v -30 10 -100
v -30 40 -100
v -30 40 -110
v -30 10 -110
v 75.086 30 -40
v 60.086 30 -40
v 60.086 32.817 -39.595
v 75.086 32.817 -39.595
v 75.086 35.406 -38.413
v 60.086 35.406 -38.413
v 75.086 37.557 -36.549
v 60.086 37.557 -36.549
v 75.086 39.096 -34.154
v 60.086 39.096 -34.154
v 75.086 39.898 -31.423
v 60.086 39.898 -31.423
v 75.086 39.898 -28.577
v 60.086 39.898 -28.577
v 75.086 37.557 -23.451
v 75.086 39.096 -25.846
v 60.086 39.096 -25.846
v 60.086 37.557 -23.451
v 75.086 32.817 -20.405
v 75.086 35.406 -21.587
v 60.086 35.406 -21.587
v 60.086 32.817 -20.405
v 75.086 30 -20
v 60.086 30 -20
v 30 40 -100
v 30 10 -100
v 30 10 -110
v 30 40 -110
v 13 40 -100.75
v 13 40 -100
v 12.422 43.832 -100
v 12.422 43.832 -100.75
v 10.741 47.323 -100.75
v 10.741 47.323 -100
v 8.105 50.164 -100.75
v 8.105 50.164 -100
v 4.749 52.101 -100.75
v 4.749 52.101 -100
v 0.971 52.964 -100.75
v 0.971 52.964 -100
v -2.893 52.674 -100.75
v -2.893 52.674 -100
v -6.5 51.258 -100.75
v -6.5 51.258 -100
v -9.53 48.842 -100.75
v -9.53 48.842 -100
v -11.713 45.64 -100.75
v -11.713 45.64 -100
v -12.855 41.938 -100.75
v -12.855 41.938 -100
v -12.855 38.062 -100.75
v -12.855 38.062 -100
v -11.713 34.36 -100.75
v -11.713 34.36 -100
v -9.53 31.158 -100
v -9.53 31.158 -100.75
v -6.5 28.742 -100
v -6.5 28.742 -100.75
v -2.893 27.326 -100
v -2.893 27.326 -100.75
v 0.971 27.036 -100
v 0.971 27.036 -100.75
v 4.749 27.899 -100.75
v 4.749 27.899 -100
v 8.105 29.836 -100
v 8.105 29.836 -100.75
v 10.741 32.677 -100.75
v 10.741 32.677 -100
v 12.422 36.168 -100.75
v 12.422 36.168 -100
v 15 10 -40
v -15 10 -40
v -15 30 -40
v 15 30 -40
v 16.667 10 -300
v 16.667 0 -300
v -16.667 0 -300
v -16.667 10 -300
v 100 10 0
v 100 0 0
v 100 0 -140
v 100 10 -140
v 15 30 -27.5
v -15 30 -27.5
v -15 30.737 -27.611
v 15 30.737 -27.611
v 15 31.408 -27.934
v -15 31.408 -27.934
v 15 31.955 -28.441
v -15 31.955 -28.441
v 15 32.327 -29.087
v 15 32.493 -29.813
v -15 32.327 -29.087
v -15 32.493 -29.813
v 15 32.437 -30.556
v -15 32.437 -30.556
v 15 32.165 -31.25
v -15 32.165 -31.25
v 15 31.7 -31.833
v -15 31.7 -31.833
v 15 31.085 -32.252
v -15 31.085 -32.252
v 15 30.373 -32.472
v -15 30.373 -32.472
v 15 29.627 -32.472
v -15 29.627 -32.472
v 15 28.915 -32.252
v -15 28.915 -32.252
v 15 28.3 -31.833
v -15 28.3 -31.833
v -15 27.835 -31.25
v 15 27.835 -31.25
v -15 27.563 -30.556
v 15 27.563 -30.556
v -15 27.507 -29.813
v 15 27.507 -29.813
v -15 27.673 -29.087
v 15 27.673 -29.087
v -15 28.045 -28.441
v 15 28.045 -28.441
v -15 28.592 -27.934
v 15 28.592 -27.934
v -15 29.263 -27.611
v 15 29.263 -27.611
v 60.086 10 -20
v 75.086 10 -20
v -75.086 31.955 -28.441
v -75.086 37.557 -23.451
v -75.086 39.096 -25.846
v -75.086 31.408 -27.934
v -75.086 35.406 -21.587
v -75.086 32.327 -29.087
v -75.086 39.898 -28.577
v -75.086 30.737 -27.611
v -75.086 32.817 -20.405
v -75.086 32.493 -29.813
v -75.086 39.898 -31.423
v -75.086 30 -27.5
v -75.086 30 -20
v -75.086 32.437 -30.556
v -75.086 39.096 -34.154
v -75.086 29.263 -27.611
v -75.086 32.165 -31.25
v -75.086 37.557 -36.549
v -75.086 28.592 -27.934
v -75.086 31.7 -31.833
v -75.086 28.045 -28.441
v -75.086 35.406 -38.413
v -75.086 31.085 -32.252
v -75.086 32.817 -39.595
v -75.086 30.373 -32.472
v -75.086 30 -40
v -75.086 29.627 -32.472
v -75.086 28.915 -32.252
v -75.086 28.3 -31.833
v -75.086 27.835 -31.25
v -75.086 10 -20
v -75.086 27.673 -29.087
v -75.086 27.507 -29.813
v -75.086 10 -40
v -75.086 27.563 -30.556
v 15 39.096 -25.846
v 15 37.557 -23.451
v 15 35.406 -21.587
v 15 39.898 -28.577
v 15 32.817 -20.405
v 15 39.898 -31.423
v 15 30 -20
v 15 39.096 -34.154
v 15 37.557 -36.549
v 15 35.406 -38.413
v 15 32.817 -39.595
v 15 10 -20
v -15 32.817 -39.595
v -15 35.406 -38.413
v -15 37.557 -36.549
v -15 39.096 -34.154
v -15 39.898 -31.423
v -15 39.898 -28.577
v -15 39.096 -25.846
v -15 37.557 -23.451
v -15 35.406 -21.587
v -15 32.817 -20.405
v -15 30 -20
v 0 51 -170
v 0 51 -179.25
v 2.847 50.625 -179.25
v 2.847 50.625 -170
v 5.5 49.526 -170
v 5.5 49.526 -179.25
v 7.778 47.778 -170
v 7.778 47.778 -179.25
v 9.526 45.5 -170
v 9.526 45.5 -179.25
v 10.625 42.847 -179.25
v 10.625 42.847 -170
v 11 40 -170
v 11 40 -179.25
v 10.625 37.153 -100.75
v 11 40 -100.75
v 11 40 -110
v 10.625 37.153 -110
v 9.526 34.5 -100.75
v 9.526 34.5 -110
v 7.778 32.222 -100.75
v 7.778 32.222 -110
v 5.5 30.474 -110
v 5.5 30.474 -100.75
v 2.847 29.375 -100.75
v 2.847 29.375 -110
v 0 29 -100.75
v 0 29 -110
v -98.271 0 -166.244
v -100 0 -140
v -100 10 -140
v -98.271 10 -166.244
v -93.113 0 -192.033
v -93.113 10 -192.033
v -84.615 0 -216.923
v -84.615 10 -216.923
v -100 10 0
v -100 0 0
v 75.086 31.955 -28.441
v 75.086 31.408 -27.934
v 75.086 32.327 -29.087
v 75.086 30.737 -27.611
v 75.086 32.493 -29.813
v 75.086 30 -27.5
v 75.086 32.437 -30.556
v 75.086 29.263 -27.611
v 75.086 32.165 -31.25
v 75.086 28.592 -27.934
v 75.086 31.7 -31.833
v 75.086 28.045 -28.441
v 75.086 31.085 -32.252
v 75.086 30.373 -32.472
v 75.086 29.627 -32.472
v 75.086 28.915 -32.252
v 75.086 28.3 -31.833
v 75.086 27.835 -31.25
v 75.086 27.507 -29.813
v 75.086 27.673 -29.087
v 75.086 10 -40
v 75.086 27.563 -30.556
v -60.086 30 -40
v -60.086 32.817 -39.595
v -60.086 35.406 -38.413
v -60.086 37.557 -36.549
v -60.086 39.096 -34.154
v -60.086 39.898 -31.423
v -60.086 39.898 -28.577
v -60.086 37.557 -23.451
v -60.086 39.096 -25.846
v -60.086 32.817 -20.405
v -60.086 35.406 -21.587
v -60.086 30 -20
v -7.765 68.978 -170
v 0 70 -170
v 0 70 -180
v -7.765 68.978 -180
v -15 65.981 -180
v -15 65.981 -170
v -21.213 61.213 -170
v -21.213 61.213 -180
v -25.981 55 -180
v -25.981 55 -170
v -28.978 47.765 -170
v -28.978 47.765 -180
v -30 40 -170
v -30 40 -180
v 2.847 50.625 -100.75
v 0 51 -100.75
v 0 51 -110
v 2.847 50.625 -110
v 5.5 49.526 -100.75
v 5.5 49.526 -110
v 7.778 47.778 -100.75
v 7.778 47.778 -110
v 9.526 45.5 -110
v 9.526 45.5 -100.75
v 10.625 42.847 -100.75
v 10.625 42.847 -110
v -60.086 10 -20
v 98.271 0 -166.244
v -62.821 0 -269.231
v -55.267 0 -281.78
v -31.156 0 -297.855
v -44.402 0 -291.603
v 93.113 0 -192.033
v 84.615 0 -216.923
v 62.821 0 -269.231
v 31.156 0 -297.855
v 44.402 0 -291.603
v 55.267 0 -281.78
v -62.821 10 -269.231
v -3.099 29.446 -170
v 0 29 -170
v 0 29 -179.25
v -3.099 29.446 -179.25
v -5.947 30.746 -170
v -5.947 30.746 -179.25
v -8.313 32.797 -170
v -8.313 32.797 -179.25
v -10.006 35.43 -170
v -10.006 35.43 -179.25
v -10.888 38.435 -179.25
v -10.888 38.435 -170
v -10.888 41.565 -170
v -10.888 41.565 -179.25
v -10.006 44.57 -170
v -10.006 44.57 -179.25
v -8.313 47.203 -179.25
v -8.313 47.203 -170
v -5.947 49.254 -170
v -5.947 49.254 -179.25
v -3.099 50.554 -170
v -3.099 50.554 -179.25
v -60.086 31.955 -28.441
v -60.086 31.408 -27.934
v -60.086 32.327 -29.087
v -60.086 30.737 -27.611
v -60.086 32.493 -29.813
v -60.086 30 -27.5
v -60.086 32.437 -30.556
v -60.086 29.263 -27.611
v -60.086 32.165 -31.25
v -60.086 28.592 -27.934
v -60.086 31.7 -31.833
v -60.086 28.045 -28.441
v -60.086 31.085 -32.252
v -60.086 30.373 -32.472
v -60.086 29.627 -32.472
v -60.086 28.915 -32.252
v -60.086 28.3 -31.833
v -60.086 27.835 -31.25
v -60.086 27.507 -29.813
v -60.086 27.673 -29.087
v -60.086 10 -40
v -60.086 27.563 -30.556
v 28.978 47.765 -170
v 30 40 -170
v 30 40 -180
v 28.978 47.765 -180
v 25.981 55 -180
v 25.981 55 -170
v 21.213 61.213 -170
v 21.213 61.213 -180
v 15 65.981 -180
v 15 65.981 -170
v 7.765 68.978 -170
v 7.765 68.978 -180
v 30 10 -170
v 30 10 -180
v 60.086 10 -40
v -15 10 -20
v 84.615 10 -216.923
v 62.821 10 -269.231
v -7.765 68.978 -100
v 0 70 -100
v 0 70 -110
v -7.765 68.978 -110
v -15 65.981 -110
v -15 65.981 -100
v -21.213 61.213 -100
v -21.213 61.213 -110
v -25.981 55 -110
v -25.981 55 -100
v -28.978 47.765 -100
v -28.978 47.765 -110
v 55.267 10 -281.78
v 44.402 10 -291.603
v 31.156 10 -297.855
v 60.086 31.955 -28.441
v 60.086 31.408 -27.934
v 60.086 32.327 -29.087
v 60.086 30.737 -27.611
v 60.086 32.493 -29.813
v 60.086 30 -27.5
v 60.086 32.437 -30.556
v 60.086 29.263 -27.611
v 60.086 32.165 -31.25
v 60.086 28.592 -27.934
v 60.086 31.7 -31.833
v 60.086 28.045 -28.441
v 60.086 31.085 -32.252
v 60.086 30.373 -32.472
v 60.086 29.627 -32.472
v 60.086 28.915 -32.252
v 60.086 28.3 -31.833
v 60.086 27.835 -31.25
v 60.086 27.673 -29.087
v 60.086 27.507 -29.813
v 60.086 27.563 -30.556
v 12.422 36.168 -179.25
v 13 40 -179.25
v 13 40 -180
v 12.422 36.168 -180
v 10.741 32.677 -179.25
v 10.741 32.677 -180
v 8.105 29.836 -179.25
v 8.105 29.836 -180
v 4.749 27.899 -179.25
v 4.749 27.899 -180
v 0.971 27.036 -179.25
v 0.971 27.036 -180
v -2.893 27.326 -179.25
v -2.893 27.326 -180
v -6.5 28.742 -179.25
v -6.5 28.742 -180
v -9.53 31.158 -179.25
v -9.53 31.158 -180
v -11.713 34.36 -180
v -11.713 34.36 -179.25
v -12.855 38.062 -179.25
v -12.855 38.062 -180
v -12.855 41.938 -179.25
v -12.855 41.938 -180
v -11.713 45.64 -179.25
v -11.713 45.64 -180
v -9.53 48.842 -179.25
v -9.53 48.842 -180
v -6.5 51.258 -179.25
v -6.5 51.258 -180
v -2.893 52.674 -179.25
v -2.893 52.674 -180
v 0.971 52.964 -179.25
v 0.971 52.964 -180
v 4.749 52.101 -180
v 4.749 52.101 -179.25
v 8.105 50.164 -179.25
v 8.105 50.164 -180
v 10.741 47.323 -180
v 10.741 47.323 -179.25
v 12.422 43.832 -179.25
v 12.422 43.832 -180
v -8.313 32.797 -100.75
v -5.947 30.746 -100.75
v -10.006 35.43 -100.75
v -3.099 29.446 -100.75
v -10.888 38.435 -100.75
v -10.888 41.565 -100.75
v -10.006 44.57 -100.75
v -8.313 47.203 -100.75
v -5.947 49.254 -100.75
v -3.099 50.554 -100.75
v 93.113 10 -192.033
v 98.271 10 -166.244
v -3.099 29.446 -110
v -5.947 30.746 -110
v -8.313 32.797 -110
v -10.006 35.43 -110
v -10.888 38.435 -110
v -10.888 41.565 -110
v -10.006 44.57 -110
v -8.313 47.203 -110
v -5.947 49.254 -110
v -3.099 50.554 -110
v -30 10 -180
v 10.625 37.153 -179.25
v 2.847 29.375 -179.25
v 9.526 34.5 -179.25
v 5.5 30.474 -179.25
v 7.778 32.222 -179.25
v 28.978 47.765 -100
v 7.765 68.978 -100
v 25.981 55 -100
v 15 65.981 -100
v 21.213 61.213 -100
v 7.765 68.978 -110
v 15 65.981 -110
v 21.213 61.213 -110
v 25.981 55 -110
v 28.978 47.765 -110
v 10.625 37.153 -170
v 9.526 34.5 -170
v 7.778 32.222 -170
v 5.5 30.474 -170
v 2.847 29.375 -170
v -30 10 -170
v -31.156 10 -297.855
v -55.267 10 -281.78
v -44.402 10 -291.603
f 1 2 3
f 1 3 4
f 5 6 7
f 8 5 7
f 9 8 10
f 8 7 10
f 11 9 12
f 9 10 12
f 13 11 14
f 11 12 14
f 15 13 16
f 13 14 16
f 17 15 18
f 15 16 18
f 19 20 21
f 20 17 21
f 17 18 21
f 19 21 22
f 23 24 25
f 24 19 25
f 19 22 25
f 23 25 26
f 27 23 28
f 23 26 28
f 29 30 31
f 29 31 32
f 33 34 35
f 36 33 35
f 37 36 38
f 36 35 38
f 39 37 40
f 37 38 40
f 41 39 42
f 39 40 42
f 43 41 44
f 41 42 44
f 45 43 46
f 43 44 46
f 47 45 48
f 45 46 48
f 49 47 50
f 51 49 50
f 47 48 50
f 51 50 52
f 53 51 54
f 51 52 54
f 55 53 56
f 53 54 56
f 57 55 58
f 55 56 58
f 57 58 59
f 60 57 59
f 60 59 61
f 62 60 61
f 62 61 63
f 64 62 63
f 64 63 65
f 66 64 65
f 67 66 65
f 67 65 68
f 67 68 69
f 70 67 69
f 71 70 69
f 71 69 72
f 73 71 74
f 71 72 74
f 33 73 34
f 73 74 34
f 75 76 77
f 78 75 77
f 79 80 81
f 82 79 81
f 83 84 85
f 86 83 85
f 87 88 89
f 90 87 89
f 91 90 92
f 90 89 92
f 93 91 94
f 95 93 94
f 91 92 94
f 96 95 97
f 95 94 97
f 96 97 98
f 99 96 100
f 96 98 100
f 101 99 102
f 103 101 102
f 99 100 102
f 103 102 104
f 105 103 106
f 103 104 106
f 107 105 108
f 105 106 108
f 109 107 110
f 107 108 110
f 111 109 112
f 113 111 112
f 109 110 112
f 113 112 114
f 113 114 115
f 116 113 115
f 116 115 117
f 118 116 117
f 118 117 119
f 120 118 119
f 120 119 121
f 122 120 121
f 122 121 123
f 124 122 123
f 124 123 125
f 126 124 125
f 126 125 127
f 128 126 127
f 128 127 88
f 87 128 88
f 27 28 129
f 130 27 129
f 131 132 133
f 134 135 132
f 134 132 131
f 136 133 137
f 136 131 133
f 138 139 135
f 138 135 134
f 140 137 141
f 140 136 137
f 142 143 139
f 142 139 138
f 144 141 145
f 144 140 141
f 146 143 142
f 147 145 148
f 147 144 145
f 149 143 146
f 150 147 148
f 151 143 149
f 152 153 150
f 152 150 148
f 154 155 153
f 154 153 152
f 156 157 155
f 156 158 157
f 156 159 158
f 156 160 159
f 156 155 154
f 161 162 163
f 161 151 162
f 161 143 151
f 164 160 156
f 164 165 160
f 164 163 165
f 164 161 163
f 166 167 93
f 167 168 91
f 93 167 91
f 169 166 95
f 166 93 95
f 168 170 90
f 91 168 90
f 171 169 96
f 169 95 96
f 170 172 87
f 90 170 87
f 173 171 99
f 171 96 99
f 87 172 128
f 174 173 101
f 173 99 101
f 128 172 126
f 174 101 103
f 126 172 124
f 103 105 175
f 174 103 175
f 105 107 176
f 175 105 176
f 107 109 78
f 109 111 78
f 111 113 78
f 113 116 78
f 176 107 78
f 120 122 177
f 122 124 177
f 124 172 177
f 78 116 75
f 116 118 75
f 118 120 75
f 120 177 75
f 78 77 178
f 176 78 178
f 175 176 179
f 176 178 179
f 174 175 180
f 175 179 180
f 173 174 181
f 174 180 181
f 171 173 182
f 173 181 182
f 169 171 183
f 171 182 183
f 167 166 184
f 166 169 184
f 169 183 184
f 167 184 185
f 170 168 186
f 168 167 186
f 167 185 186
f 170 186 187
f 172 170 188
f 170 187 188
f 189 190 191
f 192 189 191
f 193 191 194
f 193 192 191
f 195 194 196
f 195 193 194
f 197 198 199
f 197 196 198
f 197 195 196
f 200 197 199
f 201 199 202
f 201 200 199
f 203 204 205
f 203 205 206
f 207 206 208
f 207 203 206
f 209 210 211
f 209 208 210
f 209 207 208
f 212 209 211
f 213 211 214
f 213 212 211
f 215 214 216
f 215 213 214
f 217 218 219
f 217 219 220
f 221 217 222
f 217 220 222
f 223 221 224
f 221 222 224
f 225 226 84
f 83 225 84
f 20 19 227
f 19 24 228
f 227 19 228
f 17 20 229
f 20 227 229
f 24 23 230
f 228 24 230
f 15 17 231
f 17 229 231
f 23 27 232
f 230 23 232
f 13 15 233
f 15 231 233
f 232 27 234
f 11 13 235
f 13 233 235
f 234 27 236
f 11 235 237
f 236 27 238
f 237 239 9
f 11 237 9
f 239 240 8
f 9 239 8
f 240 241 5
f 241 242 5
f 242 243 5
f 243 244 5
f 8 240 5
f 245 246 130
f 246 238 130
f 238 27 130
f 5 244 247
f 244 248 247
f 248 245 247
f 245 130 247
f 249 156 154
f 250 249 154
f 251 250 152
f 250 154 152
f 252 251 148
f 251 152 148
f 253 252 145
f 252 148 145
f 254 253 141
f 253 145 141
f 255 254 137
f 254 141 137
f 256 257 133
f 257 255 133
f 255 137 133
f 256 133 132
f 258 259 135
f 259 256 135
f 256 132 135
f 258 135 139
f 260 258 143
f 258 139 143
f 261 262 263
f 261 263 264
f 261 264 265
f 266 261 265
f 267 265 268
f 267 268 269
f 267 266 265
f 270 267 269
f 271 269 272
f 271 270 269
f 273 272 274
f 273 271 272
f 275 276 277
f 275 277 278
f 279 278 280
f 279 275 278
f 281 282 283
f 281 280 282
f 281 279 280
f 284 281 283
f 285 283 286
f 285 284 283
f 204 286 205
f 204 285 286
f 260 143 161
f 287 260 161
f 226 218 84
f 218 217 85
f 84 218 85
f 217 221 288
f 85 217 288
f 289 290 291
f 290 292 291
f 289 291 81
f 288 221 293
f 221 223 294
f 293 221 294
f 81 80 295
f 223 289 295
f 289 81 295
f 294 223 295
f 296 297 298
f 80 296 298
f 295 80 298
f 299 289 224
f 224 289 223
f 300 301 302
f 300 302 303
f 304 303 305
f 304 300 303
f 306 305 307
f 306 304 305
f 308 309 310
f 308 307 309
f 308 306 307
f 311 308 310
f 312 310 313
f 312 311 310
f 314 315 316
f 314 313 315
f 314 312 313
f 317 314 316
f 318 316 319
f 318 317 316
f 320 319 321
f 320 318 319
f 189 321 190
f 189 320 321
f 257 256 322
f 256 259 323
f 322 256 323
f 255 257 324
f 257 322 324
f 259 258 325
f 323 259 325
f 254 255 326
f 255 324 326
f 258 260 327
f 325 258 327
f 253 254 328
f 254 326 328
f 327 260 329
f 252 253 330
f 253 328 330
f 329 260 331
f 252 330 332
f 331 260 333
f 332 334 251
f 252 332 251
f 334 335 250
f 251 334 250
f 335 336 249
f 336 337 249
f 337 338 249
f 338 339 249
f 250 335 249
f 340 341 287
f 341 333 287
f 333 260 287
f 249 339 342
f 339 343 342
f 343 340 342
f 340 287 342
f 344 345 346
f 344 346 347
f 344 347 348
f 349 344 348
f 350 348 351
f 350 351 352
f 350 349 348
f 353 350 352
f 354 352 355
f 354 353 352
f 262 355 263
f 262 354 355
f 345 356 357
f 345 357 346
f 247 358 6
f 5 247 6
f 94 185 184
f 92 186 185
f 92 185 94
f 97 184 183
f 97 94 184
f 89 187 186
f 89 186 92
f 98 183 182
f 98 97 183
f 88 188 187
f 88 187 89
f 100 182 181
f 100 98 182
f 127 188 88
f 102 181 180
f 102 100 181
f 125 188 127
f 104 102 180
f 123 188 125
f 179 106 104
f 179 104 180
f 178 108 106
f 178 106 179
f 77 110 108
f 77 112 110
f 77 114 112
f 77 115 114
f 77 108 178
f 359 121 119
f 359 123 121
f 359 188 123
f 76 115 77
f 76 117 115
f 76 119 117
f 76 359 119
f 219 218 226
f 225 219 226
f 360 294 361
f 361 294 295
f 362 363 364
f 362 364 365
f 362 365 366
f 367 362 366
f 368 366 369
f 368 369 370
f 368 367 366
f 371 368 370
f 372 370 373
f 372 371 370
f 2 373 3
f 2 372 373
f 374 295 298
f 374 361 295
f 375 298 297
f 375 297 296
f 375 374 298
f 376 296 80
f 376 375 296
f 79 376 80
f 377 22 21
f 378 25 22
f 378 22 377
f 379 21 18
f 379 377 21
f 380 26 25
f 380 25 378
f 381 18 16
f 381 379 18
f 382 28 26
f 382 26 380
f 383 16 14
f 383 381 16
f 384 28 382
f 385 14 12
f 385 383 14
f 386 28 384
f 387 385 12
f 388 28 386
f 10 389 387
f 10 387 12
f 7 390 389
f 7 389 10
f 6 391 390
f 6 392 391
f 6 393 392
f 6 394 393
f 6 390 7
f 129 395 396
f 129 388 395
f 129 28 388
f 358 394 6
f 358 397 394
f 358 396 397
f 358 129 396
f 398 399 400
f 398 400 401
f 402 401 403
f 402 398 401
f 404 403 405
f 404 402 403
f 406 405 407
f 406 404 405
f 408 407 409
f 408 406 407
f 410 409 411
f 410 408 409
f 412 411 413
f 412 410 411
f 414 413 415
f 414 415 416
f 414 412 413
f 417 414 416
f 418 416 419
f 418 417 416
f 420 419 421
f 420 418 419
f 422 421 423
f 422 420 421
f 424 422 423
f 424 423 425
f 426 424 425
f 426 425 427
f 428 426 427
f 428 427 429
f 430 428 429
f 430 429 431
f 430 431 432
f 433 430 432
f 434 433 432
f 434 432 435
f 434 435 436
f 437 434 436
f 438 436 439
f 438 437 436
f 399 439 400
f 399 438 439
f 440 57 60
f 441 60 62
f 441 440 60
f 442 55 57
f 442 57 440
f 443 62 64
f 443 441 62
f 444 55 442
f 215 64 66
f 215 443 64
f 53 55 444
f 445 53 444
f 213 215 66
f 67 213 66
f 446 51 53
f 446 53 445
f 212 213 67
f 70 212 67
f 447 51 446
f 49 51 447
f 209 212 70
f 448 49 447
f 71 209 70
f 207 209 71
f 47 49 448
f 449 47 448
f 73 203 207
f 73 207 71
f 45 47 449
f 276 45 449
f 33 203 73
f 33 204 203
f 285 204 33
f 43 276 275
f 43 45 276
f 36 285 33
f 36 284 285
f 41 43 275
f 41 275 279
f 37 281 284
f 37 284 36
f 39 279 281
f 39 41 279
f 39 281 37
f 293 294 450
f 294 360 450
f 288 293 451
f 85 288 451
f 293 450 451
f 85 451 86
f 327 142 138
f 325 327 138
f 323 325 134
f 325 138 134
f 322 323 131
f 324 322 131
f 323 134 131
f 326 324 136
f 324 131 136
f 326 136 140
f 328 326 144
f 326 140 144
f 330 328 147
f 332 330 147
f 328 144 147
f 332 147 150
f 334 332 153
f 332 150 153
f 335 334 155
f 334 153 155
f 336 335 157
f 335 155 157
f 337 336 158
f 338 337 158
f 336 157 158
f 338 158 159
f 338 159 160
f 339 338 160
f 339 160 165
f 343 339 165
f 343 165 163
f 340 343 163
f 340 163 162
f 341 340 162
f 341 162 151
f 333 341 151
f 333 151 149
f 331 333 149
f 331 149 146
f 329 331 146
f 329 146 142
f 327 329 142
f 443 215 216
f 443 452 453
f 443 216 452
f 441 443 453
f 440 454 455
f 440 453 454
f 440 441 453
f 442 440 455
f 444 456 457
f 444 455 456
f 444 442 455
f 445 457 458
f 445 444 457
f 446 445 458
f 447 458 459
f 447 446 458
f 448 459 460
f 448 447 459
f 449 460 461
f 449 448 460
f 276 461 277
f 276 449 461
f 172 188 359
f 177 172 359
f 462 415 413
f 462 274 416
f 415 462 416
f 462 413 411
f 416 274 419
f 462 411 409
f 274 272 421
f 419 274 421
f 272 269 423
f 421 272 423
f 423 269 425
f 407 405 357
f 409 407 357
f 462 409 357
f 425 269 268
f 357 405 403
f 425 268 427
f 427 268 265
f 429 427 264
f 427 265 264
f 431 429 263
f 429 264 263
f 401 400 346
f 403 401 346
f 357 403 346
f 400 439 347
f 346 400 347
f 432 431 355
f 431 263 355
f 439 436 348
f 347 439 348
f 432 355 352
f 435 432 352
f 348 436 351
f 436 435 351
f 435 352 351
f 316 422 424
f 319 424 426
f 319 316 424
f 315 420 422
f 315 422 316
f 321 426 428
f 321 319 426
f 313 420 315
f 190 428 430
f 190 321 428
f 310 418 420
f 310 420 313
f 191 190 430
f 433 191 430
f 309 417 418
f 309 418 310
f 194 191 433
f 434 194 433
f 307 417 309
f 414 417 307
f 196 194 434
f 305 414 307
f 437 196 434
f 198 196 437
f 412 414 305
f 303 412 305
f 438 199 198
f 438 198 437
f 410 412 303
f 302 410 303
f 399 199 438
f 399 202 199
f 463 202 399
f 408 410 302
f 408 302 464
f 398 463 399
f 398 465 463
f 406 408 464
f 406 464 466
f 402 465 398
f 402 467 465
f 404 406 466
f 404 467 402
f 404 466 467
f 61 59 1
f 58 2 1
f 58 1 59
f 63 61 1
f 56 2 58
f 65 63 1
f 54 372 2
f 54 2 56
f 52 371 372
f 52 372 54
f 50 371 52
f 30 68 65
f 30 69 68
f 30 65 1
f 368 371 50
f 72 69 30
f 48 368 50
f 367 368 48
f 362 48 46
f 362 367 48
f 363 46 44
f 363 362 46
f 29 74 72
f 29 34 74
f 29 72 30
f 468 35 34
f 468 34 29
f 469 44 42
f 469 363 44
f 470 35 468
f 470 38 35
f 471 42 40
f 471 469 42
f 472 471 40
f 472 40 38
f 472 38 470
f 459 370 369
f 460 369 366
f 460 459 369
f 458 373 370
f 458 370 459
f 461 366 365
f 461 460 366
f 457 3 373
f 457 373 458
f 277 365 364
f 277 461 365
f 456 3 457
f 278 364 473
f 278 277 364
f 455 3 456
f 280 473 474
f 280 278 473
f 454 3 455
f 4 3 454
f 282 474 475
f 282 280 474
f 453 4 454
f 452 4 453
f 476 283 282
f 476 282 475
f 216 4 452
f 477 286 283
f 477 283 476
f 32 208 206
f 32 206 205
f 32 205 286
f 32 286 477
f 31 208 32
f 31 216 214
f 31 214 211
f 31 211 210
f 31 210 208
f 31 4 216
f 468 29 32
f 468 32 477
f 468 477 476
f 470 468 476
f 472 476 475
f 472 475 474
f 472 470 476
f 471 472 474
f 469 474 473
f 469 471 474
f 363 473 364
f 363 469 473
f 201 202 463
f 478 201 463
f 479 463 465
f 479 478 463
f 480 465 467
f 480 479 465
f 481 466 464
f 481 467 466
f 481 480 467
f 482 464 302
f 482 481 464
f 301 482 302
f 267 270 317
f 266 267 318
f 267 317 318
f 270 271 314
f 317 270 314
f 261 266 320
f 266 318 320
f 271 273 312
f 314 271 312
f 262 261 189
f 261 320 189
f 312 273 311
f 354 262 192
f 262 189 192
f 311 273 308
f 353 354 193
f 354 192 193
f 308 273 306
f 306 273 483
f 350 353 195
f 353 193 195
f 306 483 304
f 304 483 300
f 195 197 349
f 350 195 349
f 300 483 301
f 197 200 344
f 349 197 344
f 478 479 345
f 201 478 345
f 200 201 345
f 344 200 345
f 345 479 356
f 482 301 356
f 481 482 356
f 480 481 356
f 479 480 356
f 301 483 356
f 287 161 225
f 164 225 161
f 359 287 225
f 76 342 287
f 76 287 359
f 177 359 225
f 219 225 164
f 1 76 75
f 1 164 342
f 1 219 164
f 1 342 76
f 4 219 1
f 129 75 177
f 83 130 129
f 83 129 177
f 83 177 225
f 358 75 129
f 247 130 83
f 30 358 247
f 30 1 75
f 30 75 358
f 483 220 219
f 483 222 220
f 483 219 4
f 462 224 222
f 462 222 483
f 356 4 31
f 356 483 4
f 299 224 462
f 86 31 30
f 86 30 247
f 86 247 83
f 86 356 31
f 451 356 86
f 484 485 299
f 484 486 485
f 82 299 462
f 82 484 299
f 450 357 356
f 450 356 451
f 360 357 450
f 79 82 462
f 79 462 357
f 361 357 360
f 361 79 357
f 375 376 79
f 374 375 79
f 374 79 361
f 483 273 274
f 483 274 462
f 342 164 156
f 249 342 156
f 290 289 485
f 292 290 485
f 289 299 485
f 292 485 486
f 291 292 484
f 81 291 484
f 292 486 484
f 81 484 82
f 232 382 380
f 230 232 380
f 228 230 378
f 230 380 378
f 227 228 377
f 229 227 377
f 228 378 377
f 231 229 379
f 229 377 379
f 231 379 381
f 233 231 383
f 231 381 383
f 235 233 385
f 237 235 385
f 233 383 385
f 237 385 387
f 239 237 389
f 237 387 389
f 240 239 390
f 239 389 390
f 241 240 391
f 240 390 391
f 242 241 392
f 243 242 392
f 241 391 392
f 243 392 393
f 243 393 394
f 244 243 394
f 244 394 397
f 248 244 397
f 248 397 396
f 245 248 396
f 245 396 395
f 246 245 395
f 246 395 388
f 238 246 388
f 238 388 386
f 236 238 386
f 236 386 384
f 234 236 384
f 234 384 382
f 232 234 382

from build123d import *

# Parameters (mm, degrees)
EXTRUDE_1_DEPTH      = 10
EXTRUDE_START        = -100
EXTRUDE_3_DEPTH      = 80
SKETCH_5_W           = 80
SKETCH_5_H           = 60
CUT_EXTRUDE_2_DEPTH  = 110
FILLET_1_R           = 50
FILLET_2_R           = 200
SKETCH_16_R          = 13
CUT_EXTRUDE_10_DEPTH = 0.75
CUT_EXTRUDE_START    = -0.75
SKETCH_17_R          = 13
CUT_EXTRUDE_11_DEPTH = 0.75
SKETCH_18_R          = 2.5
EXTRUDE_6_DEPTH      = 200
SKETCH_20_W          = 45.086358536
SKETCH_20_H          = 37.636191029
SKETCH_20_W_2        = 32.7550468
SKETCH_20_H_2        = 44.701005045
CUT_EXTRUDE_12_DEPTH = 322.869538789


with BuildPart() as part:
    # 草图1 → 凸台-拉伸1 (new body)
    with BuildSketch(Plane(origin=(0, 0, 0), x_dir=(1, 0, 0), z_dir=(0, 1, 0))):
        Polygon((-100, 0), (100, 0), (100, 180), (50, 300), (-50, 300), (-100, 180), align=None)
    extrude(amount=EXTRUDE_1_DEPTH)

    # 草图4 → 凸台-拉伸3 (add)
    with BuildSketch(Plane.XY.offset(EXTRUDE_START)):
        with BuildLine():
            Line((0, 29), (0, 10))
            Line((0, 10), (30, 10))
            Line((30, 10), (30, 40))
            ThreePointArc((30, 40), (21.213203436, 61.213203436), (0, 70))
            Line((0, 70), (0, 51))
            ThreePointArc((0, 51), (7.778174593, 47.778174593), (11, 40))
            ThreePointArc((11, 40), (7.778174593, 32.221825407), (0, 29))
        make_face()
        with BuildLine():
            Line((-30, 10), (0, 10))
            Line((0, 10), (0, 29))
            ThreePointArc((0, 29), (-11, 40), (0, 51))
            Line((0, 51), (0, 70))
            ThreePointArc((0, 70), (-21.213203436, 61.213203436), (-30, 40))
            Line((-30, 40), (-30, 10))
        make_face()
    extrude(amount=-EXTRUDE_3_DEPTH)

    # 草图5 → 切除-拉伸2 (cut)
    with BuildSketch(Plane(origin=(0, 10, 0), x_dir=(1, 0, 0), z_dir=(0, 1, 0))):
        with Locations((0, 140)):
            Rectangle(SKETCH_5_W, SKETCH_5_H)
    extrude(amount=CUT_EXTRUDE_2_DEPTH, mode=Mode.SUBTRACT)

    # 圆角1
    fillet_1_edges = [part.edges().sort_by_distance(p)[0] for p in [
        (-50, 5, -300),
        (50, 5, -300),
    ]]
    fillet(fillet_1_edges, radius=FILLET_1_R)

    # 圆角2
    fillet_2_edges = [part.edges().sort_by_distance(p)[0] for p in [
        (-100, 5, -180),
        (100, 5, -180),
    ]]
    fillet(fillet_2_edges, radius=FILLET_2_R)

    # 草图16 → 切除-拉伸10 (cut)
    with BuildSketch(Plane.XY.offset(-100)):
        with Locations((0, 40)):
            Circle(SKETCH_16_R)
    extrude(amount=-CUT_EXTRUDE_10_DEPTH, mode=Mode.SUBTRACT)

    # 草图17 → 切除-拉伸11 (cut)
    with BuildSketch(Plane(origin=(0, 0, -180), x_dir=(-1, 0, 0), z_dir=(0, 0, -1)).offset(CUT_EXTRUDE_START)):
        with Locations(Location((0, 40, 0), (0, 0, 180))):
            Circle(SKETCH_17_R)
    extrude(amount=CUT_EXTRUDE_11_DEPTH, mode=Mode.SUBTRACT)

    # 草图18 → 凸台-拉伸6 (add)
    with BuildSketch(Plane.ZY.offset(100)):
        with BuildLine():
            Line((-40, 10), (-40, 30))
            ThreePointArc((-40, 30), (-30, 40), (-20, 30))
            Line((-20, 30), (-20, 10))
            Line((-20, 10), (-40, 10))
        make_face()
        with Locations((-30, 30)):
            Circle(SKETCH_18_R, mode=Mode.SUBTRACT)
    extrude(amount=-EXTRUDE_6_DEPTH)

    # 草图20 → 切除-拉伸12 (cut, through all)
    with BuildSketch(Plane(origin=(0, 10, 0), x_dir=(1, 0, 0), z_dir=(0, 1, 0))):
        with Locations((-37.543179268, 30.422188826)):
            Rectangle(SKETCH_20_W, SKETCH_20_H)
        with Locations((91.463881936, 29.458805096)):
            Rectangle(SKETCH_20_W_2, SKETCH_20_H_2)
        with Locations((37.543179268, 30.422188826)):
            Rectangle(SKETCH_20_W, SKETCH_20_H)
        with Locations((-91.463881936, 29.458805096)):
            Rectangle(SKETCH_20_W_2, SKETCH_20_H_2)
    extrude(amount=CUT_EXTRUDE_12_DEPTH, mode=Mode.SUBTRACT)


solid = part.part
